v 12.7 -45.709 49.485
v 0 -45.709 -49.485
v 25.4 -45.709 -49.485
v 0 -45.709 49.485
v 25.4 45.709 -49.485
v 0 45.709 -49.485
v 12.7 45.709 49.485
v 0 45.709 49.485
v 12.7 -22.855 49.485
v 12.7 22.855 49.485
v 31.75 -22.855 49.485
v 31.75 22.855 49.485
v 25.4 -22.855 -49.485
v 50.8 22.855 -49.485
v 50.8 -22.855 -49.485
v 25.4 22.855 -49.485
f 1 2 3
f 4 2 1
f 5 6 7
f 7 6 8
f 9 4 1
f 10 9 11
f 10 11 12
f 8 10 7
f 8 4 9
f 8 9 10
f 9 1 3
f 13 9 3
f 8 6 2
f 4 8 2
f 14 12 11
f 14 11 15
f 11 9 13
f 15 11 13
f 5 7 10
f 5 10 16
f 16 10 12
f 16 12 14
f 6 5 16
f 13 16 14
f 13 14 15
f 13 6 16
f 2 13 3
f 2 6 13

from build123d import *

# Parameters (mm, degrees)
F0_W     = 22.854749
F0_H     = 98.96972
F1_DEPTH = 25.4
F3_DEPTH = 22.855749
F4_DEPTH = 50.8
F6_DEPTH = 22.855749


with BuildPart() as f1:
    # F0 (on Right) → F1 (new body)
    with BuildSketch(Plane.YZ):
        with Locations((-34.282123, 0)):
            Rectangle(F0_W, F0_H)
    extrude(amount=F1_DEPTH)

    # F2 (on face) → F3 (cut, through all)
    with BuildSketch(Plane.XZ.offset(45.709498)):
        Polygon((25.4, 49.48486), (12.7, 49.48486), (25.4, -49.48486), align=None)
    extrude(amount=-F3_DEPTH, mode=Mode.SUBTRACT)

    # F0 (on Right) → F4 (join)
    with BuildSketch(Plane.YZ):
        Polygon((0, -49.48486), (0, 0), (0, 49.48486), (-22.854749, 49.48486), (-22.854749, -49.48486), align=None)
    extrude(amount=F4_DEPTH)

    # F5 (on face) → F6 (cut, through all)
    with BuildSketch(Plane.XZ.offset(22.854749)):
        Polygon((50.8, 49.48486), (31.75, 49.48486), (50.8, -49.48486), align=None)
    extrude(amount=-F6_DEPTH, mode=Mode.SUBTRACT)

    # F7: F1 across plane


with BuildPart() as f1_1:
    add(f1.part)
    add(f1.part.mirror(Plane.XZ))


solid = f1_1.part
